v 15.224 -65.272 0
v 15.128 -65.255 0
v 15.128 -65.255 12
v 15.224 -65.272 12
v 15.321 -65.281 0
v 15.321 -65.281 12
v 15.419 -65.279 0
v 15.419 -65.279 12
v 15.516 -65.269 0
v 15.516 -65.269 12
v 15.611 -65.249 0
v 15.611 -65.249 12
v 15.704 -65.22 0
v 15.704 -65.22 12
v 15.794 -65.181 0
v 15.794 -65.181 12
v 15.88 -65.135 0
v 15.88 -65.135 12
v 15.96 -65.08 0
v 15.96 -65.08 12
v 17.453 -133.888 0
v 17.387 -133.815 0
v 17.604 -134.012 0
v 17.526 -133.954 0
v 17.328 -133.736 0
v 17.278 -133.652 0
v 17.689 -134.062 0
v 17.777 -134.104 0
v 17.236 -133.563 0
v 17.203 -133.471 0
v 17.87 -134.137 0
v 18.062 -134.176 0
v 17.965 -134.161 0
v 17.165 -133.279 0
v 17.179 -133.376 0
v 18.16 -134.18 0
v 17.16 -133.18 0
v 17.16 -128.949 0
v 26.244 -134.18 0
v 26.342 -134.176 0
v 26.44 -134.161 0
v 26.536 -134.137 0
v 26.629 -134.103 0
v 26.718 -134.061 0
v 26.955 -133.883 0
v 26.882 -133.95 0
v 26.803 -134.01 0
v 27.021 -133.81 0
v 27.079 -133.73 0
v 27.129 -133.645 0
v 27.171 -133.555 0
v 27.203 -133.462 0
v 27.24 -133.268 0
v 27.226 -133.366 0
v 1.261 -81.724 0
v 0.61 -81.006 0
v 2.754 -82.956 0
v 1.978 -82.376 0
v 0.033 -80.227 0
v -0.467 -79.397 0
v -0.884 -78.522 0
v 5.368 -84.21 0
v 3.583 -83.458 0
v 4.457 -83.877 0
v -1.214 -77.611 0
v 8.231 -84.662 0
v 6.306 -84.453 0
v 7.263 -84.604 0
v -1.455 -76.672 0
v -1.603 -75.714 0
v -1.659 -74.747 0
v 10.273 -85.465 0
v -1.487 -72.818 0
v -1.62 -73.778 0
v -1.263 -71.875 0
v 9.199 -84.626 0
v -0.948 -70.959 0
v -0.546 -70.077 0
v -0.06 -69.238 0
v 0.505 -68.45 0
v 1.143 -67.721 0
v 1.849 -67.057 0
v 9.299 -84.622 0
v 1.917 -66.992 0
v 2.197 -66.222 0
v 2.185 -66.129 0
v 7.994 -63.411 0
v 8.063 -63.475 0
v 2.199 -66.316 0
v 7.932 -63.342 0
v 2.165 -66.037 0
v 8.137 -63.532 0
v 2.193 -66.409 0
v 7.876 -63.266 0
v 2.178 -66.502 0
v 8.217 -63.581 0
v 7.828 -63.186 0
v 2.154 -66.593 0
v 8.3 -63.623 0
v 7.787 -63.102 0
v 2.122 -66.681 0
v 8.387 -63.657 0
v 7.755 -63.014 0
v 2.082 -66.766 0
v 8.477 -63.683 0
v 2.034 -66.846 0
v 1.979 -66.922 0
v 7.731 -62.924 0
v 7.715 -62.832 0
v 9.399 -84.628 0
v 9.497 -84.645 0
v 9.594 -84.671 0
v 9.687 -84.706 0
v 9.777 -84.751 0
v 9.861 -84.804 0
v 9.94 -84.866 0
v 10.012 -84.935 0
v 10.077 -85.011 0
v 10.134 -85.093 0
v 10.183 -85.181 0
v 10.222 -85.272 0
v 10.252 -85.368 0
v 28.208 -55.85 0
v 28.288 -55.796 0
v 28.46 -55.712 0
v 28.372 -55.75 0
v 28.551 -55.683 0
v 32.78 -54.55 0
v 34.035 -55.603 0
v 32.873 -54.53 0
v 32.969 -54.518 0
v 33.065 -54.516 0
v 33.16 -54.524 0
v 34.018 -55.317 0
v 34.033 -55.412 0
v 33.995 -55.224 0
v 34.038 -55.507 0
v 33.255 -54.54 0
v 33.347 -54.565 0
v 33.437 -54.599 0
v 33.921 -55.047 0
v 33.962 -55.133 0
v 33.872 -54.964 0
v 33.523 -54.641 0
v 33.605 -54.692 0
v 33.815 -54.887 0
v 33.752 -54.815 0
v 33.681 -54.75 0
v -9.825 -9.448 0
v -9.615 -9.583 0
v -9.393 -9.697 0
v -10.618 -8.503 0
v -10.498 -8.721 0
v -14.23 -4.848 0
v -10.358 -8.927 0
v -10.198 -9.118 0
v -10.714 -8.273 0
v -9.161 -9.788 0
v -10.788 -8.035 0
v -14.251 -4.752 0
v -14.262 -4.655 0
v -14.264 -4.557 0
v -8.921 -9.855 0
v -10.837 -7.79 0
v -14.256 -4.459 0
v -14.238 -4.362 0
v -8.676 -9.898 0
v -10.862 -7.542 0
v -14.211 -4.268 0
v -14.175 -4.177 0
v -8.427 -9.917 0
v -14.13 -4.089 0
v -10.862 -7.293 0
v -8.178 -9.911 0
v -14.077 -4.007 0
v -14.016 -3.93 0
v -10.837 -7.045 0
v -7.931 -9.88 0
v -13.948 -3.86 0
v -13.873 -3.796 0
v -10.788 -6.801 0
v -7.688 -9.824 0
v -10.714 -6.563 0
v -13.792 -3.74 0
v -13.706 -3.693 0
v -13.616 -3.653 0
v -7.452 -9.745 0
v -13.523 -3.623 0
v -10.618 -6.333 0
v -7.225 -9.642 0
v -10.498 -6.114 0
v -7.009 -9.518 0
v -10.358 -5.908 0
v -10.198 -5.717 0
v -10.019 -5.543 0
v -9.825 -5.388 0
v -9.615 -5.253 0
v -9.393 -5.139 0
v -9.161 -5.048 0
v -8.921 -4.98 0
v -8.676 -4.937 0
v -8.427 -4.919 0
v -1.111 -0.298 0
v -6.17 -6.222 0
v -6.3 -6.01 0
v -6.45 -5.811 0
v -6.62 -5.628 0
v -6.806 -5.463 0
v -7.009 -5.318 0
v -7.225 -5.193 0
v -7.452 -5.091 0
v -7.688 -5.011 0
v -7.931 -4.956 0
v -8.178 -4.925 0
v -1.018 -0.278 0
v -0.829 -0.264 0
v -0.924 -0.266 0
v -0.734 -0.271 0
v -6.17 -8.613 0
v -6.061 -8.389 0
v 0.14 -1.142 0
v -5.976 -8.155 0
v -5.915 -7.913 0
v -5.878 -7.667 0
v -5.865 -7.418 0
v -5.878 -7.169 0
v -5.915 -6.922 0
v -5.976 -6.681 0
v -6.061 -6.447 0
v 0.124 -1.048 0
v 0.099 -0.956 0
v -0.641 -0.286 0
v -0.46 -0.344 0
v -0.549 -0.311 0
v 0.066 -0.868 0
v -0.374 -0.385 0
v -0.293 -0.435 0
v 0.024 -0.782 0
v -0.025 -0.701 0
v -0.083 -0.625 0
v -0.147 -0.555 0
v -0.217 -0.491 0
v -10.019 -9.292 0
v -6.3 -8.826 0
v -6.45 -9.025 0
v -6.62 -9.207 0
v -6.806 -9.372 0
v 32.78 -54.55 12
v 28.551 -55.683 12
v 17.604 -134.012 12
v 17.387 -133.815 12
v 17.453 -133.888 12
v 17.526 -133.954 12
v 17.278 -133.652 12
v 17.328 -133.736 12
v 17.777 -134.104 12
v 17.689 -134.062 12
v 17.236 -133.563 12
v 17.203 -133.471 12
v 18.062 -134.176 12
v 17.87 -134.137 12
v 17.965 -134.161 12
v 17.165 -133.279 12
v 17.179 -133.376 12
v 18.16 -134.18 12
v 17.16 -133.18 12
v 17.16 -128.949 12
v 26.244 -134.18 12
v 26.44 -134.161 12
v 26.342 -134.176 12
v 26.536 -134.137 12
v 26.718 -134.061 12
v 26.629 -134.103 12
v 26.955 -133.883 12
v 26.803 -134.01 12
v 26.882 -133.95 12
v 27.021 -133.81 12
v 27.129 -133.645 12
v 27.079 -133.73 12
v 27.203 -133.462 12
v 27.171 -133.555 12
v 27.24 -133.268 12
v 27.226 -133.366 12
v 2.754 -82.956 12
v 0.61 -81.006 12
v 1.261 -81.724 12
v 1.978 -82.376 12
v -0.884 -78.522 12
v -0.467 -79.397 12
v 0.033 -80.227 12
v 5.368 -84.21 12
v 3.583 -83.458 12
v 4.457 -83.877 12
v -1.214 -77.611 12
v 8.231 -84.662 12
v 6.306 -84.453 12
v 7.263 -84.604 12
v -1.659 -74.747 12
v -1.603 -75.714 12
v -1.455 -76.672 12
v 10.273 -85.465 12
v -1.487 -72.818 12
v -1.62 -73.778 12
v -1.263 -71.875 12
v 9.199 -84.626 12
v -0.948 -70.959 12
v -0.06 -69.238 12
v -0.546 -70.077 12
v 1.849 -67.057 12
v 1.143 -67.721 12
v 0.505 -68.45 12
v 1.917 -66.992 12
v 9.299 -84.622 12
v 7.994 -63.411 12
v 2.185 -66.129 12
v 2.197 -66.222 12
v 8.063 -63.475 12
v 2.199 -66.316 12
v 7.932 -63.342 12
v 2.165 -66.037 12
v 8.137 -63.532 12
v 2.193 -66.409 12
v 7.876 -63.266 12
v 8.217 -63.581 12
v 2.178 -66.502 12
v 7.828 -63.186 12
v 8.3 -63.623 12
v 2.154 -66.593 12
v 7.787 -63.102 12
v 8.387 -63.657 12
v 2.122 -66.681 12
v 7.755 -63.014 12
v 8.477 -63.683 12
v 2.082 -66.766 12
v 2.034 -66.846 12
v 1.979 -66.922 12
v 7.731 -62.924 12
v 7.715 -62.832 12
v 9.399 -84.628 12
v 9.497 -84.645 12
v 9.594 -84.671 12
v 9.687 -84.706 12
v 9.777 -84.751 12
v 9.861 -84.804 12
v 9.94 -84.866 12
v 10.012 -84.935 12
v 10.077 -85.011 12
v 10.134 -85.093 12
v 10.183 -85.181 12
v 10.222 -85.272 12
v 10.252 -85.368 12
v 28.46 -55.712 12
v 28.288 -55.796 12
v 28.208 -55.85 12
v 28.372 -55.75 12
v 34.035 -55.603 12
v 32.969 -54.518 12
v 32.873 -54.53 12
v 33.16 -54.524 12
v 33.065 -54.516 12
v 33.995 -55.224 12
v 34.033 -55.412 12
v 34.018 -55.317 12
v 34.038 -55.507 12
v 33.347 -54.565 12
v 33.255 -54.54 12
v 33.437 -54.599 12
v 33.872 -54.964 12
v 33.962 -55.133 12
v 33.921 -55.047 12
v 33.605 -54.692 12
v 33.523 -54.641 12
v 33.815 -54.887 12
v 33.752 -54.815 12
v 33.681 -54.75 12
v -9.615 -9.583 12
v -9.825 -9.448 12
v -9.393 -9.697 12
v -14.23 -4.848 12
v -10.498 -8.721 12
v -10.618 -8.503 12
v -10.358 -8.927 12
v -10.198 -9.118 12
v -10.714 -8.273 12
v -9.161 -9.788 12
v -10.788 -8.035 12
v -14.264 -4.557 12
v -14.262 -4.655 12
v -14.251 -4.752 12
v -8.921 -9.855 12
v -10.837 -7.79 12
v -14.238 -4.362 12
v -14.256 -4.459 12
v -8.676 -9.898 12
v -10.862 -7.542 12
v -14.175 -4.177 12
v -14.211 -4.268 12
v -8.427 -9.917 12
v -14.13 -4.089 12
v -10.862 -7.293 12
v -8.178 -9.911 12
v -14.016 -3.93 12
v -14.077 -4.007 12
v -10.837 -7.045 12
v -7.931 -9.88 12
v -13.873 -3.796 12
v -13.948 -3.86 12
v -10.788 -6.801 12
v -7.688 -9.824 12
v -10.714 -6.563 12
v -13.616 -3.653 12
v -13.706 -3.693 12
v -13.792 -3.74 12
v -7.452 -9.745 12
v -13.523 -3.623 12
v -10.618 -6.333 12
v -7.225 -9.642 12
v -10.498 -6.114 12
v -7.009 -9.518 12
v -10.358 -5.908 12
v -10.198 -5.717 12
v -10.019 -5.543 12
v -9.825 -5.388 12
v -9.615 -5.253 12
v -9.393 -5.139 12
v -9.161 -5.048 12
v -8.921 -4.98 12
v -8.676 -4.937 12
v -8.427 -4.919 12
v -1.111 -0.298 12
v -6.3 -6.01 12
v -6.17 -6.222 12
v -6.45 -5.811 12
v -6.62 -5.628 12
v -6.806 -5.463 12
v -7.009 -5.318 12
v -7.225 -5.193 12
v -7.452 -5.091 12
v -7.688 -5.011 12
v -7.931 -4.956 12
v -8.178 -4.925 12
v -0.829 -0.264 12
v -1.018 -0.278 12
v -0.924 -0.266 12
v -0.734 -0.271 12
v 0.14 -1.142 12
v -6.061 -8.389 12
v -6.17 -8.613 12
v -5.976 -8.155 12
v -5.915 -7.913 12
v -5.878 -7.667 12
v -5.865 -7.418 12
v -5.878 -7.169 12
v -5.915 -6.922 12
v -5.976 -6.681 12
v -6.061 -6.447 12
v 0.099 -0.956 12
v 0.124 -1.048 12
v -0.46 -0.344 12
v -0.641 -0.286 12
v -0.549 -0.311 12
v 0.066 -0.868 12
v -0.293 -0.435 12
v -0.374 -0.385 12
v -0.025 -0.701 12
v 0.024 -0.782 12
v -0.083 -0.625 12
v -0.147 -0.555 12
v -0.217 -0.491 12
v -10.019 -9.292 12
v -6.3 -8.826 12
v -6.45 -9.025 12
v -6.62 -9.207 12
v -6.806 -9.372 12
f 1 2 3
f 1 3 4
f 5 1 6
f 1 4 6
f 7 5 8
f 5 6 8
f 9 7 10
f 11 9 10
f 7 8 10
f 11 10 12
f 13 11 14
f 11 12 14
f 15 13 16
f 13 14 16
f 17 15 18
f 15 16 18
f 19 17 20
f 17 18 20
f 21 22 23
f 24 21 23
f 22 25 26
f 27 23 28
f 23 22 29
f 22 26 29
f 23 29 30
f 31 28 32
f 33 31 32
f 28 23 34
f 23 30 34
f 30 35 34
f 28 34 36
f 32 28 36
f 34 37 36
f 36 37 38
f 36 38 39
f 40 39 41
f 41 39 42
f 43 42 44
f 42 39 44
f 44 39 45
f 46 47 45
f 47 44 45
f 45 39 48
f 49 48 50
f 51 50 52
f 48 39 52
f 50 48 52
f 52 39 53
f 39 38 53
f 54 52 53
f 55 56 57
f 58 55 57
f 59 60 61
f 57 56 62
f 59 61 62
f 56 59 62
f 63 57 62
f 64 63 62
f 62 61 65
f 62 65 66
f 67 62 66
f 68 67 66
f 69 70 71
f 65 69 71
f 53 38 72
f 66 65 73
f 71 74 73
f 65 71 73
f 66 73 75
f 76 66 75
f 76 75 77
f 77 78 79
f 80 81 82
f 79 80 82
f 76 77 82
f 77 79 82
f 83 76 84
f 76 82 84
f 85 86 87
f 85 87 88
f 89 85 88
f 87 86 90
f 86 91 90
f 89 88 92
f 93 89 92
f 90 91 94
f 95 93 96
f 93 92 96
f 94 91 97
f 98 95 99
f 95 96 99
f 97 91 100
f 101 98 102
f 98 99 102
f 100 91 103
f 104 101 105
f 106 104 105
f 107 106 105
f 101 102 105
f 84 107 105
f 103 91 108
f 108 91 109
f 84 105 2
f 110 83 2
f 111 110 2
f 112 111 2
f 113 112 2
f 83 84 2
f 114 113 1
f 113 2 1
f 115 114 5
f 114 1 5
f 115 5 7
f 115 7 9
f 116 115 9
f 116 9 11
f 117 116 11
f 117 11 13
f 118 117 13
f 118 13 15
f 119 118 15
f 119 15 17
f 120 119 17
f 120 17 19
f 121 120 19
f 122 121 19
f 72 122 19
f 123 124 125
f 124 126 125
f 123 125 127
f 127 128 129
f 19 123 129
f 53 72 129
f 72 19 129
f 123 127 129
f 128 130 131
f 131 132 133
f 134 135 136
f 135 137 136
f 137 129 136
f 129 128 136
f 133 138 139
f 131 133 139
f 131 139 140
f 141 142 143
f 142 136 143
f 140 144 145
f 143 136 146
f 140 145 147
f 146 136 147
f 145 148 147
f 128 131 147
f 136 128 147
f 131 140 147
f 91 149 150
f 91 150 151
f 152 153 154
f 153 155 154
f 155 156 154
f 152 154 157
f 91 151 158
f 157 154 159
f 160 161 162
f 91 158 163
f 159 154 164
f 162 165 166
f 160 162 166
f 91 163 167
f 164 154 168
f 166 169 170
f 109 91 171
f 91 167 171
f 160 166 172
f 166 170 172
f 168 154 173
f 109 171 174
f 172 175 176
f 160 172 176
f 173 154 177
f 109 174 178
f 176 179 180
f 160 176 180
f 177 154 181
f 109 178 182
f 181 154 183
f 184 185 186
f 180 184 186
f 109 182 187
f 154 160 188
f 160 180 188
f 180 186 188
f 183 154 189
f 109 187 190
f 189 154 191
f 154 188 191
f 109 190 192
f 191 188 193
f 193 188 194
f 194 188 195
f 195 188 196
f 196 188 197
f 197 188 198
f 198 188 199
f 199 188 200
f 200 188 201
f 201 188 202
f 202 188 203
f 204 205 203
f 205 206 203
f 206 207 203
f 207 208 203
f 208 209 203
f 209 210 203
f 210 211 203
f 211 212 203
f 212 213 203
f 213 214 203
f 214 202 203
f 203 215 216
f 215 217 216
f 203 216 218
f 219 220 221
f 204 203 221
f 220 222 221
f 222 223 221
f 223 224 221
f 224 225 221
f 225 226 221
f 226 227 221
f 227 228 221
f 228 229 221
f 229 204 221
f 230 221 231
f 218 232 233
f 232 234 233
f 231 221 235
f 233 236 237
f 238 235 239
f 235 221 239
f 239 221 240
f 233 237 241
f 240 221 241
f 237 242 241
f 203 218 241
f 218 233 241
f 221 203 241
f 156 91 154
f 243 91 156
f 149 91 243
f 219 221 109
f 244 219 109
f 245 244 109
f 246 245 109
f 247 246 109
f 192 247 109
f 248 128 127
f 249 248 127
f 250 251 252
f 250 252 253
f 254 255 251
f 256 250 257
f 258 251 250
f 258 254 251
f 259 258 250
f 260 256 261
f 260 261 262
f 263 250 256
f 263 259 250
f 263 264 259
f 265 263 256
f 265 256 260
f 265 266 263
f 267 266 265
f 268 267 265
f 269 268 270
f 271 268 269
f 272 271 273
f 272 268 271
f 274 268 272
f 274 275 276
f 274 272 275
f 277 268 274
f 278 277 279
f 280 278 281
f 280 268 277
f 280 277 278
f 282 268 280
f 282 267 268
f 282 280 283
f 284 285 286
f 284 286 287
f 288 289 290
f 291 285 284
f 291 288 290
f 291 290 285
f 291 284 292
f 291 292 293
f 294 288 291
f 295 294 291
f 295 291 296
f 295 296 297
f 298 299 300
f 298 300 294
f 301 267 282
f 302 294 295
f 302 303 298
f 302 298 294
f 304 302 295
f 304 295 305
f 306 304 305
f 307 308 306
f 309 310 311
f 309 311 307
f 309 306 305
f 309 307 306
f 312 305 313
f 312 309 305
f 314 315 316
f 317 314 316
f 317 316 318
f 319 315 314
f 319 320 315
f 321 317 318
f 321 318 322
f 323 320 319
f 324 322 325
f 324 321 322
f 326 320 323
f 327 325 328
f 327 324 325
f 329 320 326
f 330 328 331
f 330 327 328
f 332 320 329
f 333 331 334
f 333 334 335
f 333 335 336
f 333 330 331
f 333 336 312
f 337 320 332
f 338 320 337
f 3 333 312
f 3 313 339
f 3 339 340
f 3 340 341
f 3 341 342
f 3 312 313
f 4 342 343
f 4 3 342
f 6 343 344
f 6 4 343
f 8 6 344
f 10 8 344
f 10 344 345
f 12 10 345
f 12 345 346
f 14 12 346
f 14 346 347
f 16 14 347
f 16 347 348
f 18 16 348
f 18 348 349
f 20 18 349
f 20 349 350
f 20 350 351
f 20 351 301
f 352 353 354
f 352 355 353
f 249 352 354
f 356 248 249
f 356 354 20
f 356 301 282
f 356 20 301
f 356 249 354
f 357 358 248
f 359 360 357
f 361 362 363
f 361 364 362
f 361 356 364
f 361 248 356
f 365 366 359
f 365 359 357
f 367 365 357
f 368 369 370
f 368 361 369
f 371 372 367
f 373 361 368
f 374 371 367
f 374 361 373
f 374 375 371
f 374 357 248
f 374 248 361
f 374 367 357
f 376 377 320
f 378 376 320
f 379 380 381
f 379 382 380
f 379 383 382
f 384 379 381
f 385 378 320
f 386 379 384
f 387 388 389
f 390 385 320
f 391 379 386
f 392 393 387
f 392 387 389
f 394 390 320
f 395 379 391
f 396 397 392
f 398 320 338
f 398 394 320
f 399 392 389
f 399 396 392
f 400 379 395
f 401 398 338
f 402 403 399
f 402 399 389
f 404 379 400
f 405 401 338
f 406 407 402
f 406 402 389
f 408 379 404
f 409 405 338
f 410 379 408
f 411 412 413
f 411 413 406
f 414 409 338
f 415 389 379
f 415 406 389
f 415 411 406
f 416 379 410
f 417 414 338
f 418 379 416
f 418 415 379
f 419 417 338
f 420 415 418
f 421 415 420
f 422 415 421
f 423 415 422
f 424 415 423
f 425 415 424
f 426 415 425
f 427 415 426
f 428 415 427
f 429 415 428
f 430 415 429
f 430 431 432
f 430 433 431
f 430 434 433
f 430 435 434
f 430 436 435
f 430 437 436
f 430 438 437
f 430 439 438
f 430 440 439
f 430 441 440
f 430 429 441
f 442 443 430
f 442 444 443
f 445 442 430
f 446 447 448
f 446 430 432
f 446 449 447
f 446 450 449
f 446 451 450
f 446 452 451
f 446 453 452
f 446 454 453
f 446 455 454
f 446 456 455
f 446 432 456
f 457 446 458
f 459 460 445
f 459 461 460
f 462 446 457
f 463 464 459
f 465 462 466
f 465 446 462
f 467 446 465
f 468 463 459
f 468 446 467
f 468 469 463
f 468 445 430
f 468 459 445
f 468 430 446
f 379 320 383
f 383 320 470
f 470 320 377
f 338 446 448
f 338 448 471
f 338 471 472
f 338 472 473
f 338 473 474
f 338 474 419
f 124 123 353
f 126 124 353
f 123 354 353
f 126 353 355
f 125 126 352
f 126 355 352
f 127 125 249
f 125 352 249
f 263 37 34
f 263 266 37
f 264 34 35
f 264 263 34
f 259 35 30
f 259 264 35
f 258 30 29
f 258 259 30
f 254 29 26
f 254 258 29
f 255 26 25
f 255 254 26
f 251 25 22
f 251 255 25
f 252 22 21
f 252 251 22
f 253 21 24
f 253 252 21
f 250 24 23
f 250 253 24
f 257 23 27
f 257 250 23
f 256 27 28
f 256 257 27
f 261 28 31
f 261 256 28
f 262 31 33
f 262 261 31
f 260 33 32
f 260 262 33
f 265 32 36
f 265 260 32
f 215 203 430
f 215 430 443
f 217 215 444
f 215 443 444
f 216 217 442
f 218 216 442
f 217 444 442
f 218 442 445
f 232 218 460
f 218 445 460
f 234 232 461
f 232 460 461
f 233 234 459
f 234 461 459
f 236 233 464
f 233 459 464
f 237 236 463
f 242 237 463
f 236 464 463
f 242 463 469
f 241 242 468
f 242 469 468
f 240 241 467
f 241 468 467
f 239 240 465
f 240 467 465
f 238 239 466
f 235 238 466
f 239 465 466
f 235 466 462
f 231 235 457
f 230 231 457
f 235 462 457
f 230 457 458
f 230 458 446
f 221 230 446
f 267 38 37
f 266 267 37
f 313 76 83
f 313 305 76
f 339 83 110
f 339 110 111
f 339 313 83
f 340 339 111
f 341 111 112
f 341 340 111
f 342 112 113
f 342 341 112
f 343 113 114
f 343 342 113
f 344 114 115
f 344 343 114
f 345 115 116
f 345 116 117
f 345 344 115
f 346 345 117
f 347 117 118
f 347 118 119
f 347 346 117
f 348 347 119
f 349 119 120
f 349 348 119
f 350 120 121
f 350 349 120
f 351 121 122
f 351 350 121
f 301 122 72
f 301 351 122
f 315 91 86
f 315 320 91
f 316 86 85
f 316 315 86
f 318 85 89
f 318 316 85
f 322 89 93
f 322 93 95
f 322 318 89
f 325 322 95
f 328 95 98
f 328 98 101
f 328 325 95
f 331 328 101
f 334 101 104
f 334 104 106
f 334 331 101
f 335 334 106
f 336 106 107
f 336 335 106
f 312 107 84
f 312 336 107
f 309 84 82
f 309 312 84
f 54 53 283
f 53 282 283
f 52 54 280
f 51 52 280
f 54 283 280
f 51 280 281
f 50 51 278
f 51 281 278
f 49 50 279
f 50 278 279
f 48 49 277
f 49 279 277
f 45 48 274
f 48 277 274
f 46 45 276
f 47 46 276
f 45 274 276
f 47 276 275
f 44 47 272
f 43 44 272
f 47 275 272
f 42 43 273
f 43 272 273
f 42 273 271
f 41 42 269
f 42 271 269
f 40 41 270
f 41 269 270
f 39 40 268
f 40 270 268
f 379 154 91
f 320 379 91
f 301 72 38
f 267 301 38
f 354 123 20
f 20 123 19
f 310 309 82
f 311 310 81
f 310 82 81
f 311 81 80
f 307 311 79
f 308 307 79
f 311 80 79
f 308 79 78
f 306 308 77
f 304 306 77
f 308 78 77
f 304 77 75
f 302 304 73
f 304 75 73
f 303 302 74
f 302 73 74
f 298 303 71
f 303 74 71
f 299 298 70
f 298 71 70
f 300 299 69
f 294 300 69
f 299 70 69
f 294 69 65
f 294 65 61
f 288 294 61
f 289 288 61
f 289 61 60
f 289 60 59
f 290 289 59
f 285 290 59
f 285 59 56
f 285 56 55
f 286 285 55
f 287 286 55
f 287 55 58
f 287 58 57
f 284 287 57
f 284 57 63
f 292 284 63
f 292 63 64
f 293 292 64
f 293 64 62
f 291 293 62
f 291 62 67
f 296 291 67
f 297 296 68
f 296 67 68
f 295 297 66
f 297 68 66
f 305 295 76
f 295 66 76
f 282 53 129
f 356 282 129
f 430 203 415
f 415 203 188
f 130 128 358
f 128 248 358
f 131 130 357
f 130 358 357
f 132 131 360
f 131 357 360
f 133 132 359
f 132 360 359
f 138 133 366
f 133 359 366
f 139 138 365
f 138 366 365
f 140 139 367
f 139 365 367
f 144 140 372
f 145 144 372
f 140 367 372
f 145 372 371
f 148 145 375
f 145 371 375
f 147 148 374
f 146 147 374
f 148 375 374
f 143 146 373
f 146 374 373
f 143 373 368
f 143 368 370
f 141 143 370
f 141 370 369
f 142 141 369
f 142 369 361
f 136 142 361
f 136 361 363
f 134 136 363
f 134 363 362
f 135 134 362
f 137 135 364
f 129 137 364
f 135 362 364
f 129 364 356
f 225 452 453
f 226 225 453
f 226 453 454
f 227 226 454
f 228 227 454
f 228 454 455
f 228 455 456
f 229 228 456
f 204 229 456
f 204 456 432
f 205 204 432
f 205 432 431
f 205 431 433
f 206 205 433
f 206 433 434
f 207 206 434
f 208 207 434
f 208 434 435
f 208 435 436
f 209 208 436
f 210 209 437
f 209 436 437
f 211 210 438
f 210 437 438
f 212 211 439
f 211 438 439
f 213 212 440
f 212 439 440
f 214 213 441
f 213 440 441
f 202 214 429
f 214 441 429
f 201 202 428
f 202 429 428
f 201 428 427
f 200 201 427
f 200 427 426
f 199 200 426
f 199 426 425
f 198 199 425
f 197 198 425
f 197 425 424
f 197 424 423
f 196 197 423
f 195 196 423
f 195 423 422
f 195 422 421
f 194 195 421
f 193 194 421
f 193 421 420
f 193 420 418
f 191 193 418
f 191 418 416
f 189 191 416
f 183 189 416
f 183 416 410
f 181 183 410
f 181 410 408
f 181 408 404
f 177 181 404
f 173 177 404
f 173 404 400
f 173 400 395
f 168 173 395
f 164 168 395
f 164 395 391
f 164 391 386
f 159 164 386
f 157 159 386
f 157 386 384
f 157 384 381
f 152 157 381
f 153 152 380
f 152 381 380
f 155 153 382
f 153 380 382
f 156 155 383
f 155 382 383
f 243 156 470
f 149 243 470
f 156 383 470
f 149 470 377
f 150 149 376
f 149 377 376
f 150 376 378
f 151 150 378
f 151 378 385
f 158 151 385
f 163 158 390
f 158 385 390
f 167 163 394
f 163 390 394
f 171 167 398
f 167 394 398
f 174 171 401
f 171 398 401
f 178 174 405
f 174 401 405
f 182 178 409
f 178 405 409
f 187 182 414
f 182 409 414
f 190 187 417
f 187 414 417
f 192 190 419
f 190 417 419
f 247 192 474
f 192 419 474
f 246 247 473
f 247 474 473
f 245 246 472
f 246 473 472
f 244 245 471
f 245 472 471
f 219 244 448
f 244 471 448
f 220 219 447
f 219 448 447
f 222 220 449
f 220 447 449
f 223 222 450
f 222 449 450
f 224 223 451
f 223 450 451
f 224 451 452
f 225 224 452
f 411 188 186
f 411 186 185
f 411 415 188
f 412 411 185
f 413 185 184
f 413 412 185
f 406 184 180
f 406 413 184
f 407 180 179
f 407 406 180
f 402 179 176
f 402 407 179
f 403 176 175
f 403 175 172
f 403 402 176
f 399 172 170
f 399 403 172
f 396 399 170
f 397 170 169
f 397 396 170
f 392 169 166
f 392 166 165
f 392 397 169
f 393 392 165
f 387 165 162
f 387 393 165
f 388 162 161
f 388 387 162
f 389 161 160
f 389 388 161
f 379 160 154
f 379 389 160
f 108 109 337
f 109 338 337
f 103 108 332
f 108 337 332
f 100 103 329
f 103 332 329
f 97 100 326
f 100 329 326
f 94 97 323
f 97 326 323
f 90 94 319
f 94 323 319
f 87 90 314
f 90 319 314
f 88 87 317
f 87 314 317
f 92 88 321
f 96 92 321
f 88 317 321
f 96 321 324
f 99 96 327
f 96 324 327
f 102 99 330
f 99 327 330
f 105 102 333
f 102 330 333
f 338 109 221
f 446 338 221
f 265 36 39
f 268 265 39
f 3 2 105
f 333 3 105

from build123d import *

# Parameters (mm, degrees)
BOSS_EXTRUDE1_DEPTH = 12
SKETCH2_R           = 2.5
CUT_EXTRUDE1_DEPTH  = 139.979288596
FILLET1_R           = 1


with BuildPart() as part:
    # Sketch1 → Boss-Extrude1 (new body)
    with BuildSketch(Plane.XY):
        with BuildLine():
            Line((0, 0), (-14.488887394, -3.882285677))
            Line((-14.488887394, -3.882285677), (2.334350537, -66.667464385))
            ThreePointArc((2.334350537, -66.667464385), (-0.8237016, -78.663286709), (10.120361434, -84.502852689))
            Line((10.120361434, -84.502852689), (17.159912361, -128.948828016))
            Line((17.159912361, -128.948828016), (17.159912361, -134.180494133))
            Line((17.159912361, -134.180494133), (27.159912361, -134.180494133))
            Line((27.159912361, -134.180494133), (34.159005443, -54.180494133))
            Line((34.159005443, -54.180494133), (28.363450485, -55.733408403))
            Line((28.363450485, -55.733408403), (15.585282325, -65.362448774))
            Line((15.585282325, -65.362448774), (7.799637978, -63.522953705))
            Line((7.799637978, -63.522953705), (0, 0))
        make_face()
    extrude(amount=BOSS_EXTRUDE1_DEPTH)

    # Sketch2 → Cut-Extrude1 (cut, through all)
    with BuildSketch(Plane.XY.offset(12)):
        with Locations((-8.365163037, -7.417819582)):
            Circle(SKETCH2_R)
    extrude(amount=-CUT_EXTRUDE1_DEPTH, mode=Mode.SUBTRACT)

    # Fillet1
    fillet1_edges = [part.edges().sort_by_distance(p)[0] for p in [
        (7.799637978, -63.522953705, 6),
        (15.585282325, -65.362448774, 6),
        (28.363450485, -55.733408403, 6),
        (34.159005443, -54.180494133, 6),
        (27.159912361, -134.180494133, 6),
        (17.159912361, -134.180494133, 6),
        (10.120361434, -84.502852689, 6),
        (2.334350537, -66.667464385, 6),
        (-14.488887394, -3.882285677, 6),
        (0, 0, 6),
    ]]
    fillet(fillet1_edges, radius=FILLET1_R)


solid = part.part
